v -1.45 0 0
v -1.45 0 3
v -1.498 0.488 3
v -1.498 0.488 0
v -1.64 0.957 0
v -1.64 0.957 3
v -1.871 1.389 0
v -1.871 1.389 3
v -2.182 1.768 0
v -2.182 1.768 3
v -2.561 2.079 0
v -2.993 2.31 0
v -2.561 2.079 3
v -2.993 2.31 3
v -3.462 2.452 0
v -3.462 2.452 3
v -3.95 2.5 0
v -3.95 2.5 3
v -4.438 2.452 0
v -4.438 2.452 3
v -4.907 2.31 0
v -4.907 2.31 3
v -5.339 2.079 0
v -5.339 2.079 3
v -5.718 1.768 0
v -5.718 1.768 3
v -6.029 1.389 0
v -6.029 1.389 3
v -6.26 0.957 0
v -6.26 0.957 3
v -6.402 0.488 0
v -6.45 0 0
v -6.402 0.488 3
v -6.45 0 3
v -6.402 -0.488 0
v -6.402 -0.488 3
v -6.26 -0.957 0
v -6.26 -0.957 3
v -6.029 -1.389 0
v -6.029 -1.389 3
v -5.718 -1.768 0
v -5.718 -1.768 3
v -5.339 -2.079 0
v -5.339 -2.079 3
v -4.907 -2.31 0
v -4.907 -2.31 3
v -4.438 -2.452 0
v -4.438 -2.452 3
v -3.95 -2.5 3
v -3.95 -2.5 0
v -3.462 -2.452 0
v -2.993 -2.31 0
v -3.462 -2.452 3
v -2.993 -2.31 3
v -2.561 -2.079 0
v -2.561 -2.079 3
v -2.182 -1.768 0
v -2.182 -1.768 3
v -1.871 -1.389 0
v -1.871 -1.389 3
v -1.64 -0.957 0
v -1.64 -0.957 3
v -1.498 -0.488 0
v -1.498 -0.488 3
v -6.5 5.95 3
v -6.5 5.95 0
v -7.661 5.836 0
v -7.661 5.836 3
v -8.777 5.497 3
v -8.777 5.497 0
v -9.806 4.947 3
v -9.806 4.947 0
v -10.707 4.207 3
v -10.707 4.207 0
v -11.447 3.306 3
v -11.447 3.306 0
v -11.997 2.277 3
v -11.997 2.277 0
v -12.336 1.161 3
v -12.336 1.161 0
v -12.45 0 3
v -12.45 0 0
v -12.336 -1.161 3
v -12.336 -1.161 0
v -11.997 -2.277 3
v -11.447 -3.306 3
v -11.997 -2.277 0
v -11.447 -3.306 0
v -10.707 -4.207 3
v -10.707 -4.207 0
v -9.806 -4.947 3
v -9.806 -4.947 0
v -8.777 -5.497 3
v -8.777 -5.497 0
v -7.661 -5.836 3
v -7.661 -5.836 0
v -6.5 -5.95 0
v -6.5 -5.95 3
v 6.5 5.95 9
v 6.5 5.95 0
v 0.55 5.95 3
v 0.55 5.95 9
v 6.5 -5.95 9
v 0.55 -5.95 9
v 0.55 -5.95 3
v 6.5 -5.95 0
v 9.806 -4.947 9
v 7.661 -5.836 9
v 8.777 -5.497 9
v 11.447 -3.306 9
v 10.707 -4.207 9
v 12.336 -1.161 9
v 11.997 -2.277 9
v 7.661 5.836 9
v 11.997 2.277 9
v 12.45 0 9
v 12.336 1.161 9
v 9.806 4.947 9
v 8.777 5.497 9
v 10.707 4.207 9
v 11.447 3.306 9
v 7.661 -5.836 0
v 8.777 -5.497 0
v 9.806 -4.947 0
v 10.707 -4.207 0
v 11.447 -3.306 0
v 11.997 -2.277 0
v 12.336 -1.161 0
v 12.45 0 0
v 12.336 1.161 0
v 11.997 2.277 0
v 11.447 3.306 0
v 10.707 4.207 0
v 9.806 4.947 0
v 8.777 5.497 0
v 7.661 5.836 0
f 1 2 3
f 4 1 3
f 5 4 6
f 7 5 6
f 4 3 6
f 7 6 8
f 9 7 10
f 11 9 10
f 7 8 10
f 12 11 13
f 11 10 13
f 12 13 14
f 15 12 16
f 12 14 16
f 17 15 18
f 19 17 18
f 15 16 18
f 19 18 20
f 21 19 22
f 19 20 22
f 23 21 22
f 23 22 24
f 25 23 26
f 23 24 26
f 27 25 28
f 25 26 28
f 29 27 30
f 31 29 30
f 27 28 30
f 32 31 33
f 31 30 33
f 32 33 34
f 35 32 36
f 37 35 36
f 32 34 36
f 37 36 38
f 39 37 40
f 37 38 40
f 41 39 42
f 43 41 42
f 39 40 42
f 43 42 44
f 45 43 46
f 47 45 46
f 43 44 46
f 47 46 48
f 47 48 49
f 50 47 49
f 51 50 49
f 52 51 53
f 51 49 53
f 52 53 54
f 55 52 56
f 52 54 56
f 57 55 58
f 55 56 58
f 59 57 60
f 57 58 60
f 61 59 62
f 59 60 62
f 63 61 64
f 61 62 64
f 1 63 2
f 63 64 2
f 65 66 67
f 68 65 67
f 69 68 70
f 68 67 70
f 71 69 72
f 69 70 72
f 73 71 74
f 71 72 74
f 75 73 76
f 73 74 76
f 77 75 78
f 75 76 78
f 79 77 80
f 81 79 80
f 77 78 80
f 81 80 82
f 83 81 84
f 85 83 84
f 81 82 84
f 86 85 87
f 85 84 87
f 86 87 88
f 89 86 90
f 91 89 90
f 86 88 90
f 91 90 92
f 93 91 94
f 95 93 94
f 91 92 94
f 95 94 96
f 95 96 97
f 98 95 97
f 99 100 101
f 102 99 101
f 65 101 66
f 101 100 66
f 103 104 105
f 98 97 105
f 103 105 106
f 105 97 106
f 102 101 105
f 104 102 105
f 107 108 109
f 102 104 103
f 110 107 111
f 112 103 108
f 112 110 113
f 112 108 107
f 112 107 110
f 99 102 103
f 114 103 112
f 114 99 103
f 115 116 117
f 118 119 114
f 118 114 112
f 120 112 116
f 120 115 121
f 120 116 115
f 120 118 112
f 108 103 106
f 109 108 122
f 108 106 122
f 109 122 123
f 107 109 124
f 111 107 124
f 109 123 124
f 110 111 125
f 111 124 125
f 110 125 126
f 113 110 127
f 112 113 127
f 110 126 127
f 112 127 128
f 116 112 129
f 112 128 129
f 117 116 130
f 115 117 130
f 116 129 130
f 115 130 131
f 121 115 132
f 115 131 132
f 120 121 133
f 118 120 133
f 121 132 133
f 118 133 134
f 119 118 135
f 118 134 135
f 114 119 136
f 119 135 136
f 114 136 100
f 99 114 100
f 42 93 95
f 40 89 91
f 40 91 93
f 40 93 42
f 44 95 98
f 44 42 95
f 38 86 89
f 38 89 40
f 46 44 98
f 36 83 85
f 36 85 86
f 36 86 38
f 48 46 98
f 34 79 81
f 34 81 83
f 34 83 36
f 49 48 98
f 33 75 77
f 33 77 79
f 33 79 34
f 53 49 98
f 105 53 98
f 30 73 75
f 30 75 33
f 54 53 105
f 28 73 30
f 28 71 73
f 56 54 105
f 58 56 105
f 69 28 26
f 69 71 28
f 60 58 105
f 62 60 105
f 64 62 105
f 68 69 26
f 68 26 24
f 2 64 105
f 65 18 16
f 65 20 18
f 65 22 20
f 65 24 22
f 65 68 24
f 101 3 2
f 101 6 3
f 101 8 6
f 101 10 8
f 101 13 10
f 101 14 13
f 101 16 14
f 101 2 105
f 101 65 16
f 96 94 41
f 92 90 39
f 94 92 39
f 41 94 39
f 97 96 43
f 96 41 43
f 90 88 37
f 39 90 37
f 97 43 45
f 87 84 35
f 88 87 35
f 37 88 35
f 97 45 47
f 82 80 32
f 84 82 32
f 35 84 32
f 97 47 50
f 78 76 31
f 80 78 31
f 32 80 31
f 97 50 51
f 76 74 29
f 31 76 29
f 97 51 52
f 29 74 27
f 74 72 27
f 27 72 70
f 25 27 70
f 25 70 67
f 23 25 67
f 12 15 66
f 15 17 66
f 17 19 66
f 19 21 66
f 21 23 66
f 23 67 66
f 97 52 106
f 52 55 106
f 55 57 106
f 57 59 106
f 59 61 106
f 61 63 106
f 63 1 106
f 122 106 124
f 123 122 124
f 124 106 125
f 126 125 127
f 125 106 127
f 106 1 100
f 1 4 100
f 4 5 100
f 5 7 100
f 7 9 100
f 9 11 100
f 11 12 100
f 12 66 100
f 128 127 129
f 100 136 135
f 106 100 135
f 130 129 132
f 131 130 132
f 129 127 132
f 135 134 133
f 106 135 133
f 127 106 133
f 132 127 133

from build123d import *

# Parameters (mm, degrees)
F0_R     = 2.5
F1_DEPTH = 3
F3_DEPTH = 6
F4_R     = 2.5
F5_DEPTH = 3


with BuildPart() as f1:
    # F0 (on Top) → F1 (new body)
    with BuildSketch(Plane.XY):
        with BuildLine():
            ThreePointArc((-6.5, 5.95), (-12.45, 0), (-6.5, -5.95))
            Line((-6.5, -5.95), (6.5, -5.95))
            ThreePointArc((6.5, -5.95), (12.45, 0), (6.5, 5.95))
            Line((6.5, 5.95), (-6.5, 5.95))
        make_face()
        with Locations((-3.95, 0)):
            Circle(F0_R, mode=Mode.SUBTRACT)
        with Locations((-3.95, 0)):
            Circle(F0_R)
    extrude(amount=F1_DEPTH)

    # F2 (on face) → F3 (join)
    with BuildSketch(Plane.XY.offset(3)):
        with BuildLine():
            Line((6.5, 5.95), (0.55, 5.95))
            Line((0.55, 5.95), (0.55, -5.95))
            Line((0.55, -5.95), (6.5, -5.95))
            ThreePointArc((6.5, -5.95), (12.45, 0), (6.5, 5.95))
        make_face()
    extrude(amount=F3_DEPTH)

    # F4 (on face) → F5 (cut)
    with BuildSketch(Plane.XY.offset(3)):
        with Locations((-3.95, 0)):
            Circle(F4_R)
    extrude(amount=-F5_DEPTH, mode=Mode.SUBTRACT)


solid = f1.part
